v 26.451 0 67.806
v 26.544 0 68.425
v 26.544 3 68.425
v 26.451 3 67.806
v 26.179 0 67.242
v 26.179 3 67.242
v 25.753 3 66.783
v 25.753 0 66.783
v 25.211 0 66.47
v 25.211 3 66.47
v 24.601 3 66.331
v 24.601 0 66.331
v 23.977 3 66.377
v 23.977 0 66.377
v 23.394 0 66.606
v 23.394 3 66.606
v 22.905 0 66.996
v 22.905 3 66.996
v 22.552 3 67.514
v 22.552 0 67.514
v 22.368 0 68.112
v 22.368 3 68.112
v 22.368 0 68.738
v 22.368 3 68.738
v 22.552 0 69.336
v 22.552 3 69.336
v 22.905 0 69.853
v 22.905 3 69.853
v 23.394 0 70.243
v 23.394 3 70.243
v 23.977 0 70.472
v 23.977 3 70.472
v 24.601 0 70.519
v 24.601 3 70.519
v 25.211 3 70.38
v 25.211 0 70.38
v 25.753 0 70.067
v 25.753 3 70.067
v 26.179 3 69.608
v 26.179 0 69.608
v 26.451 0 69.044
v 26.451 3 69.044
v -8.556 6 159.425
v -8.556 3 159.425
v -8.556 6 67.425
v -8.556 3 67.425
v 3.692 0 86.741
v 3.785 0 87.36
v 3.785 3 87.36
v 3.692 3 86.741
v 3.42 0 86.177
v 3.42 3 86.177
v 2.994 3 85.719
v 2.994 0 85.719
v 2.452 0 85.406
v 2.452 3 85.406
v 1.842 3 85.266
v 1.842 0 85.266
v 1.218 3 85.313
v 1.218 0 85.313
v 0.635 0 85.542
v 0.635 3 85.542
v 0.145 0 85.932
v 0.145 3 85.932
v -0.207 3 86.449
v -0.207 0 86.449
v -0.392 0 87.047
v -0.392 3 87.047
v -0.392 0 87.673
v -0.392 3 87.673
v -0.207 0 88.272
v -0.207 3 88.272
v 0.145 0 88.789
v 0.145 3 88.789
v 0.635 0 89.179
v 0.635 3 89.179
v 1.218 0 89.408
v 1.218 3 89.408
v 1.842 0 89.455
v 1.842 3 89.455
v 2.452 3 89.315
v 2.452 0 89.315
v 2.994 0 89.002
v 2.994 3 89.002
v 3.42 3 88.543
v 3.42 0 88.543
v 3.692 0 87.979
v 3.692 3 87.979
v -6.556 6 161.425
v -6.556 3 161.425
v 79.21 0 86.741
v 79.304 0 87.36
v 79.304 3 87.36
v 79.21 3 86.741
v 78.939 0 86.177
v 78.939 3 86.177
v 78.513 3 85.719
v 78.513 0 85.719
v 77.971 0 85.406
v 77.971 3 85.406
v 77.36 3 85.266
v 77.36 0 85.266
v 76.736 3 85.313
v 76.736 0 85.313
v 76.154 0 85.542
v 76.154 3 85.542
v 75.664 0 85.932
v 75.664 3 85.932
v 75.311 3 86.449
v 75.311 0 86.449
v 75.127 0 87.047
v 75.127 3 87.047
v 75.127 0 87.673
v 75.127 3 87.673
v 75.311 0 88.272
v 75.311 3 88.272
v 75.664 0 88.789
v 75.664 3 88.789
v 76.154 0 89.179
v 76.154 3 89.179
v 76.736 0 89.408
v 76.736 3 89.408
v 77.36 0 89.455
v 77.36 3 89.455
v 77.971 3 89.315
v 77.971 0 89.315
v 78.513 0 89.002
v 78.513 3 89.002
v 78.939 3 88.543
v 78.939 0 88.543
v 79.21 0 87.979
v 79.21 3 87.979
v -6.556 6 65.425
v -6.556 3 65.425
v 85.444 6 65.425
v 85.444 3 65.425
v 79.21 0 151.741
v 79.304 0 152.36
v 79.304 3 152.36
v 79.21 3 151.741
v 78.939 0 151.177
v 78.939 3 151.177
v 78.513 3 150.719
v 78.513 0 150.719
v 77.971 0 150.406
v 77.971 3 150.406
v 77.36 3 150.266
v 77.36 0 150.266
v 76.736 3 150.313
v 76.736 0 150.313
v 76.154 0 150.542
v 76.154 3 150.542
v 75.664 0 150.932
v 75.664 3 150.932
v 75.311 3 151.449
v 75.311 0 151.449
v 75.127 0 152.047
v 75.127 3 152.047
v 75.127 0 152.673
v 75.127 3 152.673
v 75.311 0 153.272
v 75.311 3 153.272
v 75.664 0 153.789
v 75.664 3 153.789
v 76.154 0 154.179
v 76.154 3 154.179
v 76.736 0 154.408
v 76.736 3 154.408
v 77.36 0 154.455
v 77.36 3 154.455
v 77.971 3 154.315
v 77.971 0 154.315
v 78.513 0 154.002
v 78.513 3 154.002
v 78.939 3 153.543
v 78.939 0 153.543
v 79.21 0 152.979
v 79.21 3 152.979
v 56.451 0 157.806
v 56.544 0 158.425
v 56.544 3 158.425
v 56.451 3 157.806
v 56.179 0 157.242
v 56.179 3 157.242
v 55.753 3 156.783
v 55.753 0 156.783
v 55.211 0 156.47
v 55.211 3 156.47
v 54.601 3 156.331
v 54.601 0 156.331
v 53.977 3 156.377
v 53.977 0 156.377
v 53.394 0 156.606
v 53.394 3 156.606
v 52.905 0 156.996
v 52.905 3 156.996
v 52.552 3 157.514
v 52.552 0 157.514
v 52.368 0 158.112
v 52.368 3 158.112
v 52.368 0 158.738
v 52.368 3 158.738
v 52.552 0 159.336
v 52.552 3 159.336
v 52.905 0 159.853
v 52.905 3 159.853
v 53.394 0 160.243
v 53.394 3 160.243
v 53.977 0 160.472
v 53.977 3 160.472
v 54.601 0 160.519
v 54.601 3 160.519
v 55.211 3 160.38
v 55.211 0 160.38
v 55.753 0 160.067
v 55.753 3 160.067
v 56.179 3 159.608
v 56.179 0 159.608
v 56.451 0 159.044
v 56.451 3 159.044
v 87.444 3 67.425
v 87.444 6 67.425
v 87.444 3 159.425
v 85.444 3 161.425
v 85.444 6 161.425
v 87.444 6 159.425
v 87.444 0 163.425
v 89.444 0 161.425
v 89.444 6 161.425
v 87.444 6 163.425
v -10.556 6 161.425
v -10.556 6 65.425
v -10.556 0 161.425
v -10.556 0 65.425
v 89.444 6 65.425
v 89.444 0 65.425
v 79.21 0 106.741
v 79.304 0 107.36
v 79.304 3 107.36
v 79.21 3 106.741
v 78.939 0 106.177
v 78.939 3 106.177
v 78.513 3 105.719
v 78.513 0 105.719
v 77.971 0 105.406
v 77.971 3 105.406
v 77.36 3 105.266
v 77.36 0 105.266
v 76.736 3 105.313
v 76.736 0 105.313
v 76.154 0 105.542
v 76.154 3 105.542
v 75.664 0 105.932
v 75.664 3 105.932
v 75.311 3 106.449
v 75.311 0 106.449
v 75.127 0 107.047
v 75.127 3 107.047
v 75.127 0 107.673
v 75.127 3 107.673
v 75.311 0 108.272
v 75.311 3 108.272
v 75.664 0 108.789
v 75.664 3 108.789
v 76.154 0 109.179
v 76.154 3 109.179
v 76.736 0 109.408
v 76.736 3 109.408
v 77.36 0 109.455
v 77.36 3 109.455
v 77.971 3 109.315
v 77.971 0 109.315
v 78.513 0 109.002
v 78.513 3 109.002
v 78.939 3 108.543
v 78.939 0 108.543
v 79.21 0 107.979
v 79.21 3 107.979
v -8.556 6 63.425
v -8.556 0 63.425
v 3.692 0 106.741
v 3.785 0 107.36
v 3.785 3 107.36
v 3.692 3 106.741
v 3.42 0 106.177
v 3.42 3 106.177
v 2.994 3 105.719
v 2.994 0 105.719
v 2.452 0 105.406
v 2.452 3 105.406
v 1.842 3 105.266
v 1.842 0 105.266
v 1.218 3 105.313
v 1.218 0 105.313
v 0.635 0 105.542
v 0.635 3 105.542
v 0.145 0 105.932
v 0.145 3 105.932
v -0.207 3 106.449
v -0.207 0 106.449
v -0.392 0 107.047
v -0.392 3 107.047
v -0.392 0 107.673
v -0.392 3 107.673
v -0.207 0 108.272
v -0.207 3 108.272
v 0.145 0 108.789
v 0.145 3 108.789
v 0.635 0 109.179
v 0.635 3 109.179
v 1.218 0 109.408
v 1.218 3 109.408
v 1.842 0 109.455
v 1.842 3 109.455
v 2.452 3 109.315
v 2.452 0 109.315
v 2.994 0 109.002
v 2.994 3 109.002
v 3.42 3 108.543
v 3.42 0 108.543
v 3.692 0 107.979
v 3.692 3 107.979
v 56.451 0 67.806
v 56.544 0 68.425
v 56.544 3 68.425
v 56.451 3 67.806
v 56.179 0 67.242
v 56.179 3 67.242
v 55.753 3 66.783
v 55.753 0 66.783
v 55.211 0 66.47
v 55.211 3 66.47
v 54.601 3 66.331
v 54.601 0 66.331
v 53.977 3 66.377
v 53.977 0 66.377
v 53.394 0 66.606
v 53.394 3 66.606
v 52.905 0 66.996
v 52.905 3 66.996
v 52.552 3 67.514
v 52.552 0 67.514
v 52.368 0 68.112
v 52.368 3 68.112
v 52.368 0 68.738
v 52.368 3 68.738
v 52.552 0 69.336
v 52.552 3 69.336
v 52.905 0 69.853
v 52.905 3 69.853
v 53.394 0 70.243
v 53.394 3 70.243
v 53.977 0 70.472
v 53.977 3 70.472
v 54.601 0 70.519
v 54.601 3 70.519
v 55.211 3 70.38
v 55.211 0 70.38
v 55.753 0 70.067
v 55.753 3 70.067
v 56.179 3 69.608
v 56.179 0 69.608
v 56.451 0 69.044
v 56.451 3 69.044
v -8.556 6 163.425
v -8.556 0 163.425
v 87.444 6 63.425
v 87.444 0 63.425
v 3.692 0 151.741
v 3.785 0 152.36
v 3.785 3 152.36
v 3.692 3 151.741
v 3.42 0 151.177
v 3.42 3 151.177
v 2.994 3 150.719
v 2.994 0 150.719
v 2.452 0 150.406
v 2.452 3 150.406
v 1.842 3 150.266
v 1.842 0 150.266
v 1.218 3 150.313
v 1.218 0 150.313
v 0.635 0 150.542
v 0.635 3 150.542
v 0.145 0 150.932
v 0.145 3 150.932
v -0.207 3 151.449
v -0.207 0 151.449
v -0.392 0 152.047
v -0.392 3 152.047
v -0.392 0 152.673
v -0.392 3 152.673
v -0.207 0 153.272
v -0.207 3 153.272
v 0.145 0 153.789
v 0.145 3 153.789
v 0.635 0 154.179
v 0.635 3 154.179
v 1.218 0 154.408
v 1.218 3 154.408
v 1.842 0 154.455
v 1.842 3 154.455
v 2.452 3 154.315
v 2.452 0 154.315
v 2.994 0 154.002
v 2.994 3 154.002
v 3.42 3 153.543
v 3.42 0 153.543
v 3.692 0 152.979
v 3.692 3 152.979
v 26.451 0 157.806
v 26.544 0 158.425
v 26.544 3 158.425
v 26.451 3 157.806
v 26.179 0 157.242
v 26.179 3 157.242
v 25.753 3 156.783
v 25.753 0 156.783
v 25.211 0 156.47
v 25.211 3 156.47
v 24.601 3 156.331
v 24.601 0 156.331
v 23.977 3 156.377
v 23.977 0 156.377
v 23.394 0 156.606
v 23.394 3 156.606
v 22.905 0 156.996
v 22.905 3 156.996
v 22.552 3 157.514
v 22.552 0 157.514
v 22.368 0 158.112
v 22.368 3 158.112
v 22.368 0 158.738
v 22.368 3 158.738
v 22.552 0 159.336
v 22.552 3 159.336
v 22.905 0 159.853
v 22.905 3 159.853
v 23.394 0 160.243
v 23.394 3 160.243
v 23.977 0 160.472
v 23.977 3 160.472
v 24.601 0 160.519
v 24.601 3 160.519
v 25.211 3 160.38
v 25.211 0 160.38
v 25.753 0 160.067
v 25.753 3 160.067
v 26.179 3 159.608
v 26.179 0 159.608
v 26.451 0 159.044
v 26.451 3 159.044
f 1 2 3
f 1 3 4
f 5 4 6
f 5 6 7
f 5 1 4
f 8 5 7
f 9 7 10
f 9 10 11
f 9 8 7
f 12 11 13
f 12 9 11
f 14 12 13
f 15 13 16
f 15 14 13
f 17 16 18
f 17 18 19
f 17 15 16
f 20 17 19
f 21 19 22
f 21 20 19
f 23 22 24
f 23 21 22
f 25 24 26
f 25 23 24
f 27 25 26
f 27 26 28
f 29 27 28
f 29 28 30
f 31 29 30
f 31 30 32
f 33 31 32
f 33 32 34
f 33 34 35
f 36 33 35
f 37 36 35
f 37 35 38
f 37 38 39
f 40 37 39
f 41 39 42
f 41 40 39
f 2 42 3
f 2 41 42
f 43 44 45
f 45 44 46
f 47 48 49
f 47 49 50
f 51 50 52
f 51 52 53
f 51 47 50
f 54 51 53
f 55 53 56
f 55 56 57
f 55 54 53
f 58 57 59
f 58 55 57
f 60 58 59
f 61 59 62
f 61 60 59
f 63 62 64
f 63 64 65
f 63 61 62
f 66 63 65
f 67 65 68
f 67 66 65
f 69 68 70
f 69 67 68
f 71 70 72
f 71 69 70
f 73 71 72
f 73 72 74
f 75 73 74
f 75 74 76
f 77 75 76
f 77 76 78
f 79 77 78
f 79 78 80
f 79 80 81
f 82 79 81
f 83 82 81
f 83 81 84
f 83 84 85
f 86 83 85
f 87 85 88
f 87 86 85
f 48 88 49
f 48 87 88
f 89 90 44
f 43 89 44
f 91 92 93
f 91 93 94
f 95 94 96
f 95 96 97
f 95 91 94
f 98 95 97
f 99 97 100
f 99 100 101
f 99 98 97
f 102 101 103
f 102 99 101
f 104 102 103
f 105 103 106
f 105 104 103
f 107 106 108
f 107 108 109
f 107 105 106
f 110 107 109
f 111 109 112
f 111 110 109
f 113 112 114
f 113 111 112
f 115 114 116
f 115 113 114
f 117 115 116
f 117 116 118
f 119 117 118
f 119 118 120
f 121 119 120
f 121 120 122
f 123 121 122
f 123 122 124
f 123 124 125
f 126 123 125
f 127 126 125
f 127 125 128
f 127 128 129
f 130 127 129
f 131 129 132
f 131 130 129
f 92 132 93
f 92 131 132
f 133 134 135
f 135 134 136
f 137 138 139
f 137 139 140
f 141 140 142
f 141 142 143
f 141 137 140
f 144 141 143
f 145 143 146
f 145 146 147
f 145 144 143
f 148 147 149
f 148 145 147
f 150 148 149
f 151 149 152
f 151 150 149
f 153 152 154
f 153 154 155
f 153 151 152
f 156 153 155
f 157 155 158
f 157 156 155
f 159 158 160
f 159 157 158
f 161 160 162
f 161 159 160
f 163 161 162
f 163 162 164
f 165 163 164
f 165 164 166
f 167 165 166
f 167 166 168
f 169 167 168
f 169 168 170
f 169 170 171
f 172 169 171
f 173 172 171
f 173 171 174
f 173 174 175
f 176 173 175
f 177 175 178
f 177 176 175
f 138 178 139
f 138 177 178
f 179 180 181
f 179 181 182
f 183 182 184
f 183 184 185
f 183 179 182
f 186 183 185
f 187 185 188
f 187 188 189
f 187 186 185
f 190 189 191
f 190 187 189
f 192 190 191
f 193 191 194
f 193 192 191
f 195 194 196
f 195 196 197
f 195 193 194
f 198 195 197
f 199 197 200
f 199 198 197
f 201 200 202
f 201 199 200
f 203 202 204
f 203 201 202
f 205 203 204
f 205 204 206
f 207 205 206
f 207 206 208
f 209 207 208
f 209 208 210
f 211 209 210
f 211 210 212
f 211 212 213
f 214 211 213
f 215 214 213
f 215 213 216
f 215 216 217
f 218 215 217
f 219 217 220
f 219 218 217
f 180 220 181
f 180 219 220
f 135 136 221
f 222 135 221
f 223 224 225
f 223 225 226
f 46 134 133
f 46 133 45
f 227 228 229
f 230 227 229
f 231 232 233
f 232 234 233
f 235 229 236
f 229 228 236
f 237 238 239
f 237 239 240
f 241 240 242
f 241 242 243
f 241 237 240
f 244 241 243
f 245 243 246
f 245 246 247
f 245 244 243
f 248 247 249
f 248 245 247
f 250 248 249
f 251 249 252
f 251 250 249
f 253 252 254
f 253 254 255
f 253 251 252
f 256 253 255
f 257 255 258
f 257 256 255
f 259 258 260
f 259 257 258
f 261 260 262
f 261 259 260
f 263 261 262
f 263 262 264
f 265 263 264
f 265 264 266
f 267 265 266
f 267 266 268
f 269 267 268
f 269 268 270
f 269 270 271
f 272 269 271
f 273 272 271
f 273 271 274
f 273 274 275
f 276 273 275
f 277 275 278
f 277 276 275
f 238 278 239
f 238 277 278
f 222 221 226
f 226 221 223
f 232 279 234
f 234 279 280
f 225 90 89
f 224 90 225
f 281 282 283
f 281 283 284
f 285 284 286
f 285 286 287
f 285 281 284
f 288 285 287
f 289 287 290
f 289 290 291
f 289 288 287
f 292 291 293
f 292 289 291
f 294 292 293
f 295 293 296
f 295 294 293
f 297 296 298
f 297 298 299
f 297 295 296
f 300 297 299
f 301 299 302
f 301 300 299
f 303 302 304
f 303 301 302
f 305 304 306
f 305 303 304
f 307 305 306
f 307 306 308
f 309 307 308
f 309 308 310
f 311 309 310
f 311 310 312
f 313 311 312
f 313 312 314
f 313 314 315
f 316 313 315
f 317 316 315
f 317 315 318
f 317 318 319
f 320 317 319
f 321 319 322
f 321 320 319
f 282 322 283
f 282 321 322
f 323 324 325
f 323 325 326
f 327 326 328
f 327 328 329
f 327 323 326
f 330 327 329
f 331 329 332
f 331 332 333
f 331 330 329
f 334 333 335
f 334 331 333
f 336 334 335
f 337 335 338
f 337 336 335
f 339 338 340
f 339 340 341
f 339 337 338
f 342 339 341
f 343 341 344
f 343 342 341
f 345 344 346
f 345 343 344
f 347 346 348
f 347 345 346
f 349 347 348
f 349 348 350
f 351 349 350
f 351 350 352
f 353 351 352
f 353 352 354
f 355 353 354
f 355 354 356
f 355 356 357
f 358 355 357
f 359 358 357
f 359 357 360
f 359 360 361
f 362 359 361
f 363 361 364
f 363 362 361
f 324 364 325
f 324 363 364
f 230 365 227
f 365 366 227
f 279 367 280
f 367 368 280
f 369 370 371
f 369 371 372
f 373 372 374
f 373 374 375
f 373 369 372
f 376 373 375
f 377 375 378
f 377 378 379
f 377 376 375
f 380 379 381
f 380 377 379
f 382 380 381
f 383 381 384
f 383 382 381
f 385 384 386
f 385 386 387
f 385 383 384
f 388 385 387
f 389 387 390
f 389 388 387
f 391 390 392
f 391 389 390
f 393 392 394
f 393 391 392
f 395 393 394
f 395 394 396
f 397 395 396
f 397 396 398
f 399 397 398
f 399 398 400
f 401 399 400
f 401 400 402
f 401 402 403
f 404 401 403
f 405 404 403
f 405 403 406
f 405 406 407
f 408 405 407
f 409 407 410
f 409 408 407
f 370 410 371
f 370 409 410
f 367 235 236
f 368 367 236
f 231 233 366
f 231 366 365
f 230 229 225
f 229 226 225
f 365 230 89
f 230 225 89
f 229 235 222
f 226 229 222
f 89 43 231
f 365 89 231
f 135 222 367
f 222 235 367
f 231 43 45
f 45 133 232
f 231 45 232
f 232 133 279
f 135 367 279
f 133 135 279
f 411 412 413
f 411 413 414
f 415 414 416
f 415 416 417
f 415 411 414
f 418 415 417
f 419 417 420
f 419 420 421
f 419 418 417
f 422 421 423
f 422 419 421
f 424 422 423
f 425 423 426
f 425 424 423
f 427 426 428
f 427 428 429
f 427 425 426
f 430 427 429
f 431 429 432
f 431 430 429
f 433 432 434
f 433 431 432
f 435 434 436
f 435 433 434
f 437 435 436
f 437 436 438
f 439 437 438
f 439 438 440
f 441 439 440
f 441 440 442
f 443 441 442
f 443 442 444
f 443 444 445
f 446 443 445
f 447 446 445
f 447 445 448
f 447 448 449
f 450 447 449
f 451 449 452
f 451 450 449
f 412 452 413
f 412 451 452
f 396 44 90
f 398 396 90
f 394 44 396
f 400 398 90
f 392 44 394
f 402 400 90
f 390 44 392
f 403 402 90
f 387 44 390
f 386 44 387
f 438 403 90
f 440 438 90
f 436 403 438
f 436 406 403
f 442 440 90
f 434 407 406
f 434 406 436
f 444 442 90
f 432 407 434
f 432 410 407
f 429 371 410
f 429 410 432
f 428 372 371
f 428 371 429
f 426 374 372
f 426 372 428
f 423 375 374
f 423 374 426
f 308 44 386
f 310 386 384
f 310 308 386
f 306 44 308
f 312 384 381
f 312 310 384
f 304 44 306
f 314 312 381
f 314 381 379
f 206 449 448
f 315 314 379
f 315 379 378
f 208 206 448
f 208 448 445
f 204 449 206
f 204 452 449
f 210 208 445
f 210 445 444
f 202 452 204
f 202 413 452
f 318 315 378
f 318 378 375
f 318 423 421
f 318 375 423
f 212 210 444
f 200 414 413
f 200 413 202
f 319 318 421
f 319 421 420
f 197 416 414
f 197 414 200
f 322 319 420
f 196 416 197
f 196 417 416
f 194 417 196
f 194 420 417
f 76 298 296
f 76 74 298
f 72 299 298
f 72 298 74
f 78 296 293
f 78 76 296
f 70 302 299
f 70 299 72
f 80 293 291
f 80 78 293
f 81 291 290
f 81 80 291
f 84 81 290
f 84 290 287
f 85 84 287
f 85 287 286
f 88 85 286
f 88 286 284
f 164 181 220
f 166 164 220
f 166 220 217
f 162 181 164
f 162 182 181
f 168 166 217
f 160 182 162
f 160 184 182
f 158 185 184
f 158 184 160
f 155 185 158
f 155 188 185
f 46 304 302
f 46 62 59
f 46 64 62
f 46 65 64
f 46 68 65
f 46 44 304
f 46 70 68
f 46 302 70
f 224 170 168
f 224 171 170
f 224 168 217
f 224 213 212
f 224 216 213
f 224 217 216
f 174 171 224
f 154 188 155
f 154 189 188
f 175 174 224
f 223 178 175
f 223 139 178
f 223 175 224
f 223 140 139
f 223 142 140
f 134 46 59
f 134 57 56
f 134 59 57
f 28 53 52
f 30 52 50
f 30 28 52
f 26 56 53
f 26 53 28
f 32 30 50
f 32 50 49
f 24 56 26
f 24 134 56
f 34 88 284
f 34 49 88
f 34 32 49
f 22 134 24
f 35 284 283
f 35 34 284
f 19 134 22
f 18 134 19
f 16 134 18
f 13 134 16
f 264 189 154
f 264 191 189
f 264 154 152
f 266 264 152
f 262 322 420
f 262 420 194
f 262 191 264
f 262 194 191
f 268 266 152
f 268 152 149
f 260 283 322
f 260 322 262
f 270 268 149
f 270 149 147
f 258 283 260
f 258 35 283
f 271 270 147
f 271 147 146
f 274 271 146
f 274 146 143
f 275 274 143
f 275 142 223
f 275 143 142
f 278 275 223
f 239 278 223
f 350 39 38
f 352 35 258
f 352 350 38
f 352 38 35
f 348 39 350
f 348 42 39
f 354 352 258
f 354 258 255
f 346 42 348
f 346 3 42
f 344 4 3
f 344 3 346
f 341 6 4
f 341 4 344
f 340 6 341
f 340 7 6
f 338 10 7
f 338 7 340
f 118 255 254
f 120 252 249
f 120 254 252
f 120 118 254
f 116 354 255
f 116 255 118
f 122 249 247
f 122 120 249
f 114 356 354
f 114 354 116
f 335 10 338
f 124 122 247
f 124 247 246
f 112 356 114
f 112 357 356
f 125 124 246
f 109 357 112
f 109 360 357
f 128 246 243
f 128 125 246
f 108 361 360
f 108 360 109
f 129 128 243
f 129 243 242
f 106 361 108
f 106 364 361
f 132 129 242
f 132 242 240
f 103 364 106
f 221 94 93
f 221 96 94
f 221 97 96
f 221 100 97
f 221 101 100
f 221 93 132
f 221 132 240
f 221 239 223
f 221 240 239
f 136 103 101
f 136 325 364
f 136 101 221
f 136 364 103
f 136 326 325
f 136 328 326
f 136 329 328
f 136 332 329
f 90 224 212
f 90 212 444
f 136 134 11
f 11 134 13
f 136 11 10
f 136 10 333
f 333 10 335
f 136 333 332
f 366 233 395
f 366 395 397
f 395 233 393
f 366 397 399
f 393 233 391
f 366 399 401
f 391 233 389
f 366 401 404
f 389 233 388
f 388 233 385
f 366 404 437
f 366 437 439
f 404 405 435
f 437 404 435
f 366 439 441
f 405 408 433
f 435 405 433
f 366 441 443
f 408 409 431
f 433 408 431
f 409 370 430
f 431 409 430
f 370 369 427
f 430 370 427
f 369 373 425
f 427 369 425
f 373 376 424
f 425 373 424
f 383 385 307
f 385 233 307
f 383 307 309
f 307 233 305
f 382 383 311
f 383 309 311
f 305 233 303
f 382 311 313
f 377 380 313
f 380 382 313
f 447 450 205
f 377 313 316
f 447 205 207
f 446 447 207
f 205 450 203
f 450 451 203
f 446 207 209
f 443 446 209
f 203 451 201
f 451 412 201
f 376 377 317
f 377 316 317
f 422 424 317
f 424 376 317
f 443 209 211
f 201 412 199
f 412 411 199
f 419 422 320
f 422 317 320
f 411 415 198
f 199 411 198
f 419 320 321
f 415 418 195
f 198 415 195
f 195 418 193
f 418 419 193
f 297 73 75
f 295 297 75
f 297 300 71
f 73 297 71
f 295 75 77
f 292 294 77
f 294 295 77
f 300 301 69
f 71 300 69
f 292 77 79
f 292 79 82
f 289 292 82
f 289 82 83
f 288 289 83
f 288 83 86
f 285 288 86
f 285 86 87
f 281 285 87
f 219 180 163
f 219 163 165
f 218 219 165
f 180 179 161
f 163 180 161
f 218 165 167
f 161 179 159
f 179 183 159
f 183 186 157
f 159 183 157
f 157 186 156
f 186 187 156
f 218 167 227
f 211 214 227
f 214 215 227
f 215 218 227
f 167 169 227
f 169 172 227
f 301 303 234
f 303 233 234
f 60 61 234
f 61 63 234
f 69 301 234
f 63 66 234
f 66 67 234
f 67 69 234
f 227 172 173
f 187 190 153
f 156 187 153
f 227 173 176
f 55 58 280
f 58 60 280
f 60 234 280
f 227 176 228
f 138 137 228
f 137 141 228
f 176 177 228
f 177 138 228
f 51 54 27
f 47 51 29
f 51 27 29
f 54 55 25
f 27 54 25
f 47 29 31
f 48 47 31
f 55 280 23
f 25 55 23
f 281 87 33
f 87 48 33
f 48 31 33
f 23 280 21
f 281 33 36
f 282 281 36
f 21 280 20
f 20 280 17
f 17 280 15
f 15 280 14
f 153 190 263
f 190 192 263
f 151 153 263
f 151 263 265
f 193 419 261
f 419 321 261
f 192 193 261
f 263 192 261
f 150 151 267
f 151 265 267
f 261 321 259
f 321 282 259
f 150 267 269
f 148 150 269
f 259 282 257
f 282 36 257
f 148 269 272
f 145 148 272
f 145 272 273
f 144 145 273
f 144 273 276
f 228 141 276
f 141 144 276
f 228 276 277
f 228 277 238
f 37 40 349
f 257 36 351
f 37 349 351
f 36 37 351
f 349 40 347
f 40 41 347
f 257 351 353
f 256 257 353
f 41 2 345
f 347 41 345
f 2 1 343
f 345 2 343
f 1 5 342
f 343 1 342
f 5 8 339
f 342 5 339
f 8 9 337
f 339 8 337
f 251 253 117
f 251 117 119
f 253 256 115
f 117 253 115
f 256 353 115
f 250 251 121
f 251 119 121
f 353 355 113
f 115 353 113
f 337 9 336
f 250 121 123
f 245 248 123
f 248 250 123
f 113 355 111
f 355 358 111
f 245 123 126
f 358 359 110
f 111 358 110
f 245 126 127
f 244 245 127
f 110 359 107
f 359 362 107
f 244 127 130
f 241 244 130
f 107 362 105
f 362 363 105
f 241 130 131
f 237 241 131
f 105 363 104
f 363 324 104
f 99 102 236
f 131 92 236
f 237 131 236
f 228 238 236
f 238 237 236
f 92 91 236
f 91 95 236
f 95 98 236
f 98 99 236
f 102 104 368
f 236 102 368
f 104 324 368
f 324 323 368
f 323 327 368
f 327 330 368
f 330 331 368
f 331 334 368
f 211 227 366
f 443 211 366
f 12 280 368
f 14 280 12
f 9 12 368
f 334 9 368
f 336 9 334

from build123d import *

# Parameters (mm, degrees)
SKETCH6_W           = 100
SKETCH6_H           = 100
SKETCH6_R           = 2.1
BOSS_EXTRUDE2_DEPTH = 3
BOSS_EXTRUDE3_DEPTH = 3
SKETCH8_W           = 96
SKETCH8_H           = 2
BOSS_EXTRUDE4_DEPTH = 3
CHAMFER1_SIZE       = 2
BOSS_EXTRUDE5_DEPTH = 3


with BuildPart() as part:
    # Sketch6 → Boss-Extrude2 (new body)
    with BuildSketch(Plane(origin=(0, 0, 0), x_dir=(1, 0, 0), z_dir=(0, 1, 0))):
        with Locations((39.444153985, -113.424821635)):
            Rectangle(SKETCH6_W, SKETCH6_H)
        with Locations((1.68480047, -87.360414745)):
            Circle(SKETCH6_R, mode=Mode.SUBTRACT)
        with Locations((1.68480047, -107.360414745)):
            Circle(SKETCH6_R, mode=Mode.SUBTRACT)
        with Locations((1.68480047, -152.360414745)):
            Circle(SKETCH6_R, mode=Mode.SUBTRACT)
        with Locations((24.444153985, -158.424821635)):
            Circle(SKETCH6_R, mode=Mode.SUBTRACT)
        with Locations((24.444153985, -68.424821635)):
            Circle(SKETCH6_R, mode=Mode.SUBTRACT)
        with Locations((54.444153985, -158.424821635)):
            Circle(SKETCH6_R, mode=Mode.SUBTRACT)
        with Locations((77.2035075, -152.360414745)):
            Circle(SKETCH6_R, mode=Mode.SUBTRACT)
        with Locations((77.2035075, -107.360414745)):
            Circle(SKETCH6_R, mode=Mode.SUBTRACT)
        with Locations((77.2035075, -87.360414745)):
            Circle(SKETCH6_R, mode=Mode.SUBTRACT)
        with Locations((54.444153985, -68.424821635)):
            Circle(SKETCH6_R, mode=Mode.SUBTRACT)
    extrude(amount=BOSS_EXTRUDE2_DEPTH)

    # Sketch7 → Boss-Extrude3 (add)
    with BuildSketch(Plane(origin=(0, 3, 0), x_dir=(1, 0, 0), z_dir=(0, 1, 0))):
        Polygon((-10.555846015, -63.424821635), (-10.555846015, -163.424821635), (-8.555846015, -163.424821635), (-8.555846015, -65.424821635), (87.444153985, -65.424821635), (87.444153985, -163.424821635), (89.444153985, -163.424821635), (89.444153985, -63.424821635), align=None)
    extrude(amount=BOSS_EXTRUDE3_DEPTH)

    # Sketch8 → Boss-Extrude4 (add)
    with BuildSketch(Plane(origin=(0, 3, 0), x_dir=(1, 0, 0), z_dir=(0, 1, 0))):
        with Locations((39.444153985, -162.424821635)):
            Rectangle(SKETCH8_W, SKETCH8_H)
    extrude(amount=BOSS_EXTRUDE4_DEPTH)

    # Chamfer1
    chamfer1_edges = [part.edges().sort_by_distance(p)[0] for p in [
        (-10.555846015, 3, 63.424821635),
        (89.444153985, 3, 63.424821635),
        (89.444153985, 3, 163.424821635),
        (-10.555846015, 3, 163.424821635),
    ]]
    chamfer(chamfer1_edges, length=CHAMFER1_SIZE)

    # Sketch9 → Boss-Extrude5 (add)
    with BuildSketch(Plane(origin=(0, 3, 0), x_dir=(1, 0, 0), z_dir=(0, 1, 0))):
        Polygon((-6.555846015, -65.424821635), (-8.555846015, -67.424821635), (-8.555846015, -65.424821635), align=None)
        Polygon((87.444153985, -67.424821635), (87.444153985, -65.424821635), (85.444153985, -65.424821635), align=None)
        Polygon((85.444153985, -161.424821635), (87.444153985, -159.424821635), (87.444153985, -161.424821635), align=None)
        Polygon((-8.555846015, -159.424821635), (-8.555846015, -161.424821635), (-6.555846015, -161.424821635), align=None)
    extrude(amount=BOSS_EXTRUDE5_DEPTH)


solid = part.part
